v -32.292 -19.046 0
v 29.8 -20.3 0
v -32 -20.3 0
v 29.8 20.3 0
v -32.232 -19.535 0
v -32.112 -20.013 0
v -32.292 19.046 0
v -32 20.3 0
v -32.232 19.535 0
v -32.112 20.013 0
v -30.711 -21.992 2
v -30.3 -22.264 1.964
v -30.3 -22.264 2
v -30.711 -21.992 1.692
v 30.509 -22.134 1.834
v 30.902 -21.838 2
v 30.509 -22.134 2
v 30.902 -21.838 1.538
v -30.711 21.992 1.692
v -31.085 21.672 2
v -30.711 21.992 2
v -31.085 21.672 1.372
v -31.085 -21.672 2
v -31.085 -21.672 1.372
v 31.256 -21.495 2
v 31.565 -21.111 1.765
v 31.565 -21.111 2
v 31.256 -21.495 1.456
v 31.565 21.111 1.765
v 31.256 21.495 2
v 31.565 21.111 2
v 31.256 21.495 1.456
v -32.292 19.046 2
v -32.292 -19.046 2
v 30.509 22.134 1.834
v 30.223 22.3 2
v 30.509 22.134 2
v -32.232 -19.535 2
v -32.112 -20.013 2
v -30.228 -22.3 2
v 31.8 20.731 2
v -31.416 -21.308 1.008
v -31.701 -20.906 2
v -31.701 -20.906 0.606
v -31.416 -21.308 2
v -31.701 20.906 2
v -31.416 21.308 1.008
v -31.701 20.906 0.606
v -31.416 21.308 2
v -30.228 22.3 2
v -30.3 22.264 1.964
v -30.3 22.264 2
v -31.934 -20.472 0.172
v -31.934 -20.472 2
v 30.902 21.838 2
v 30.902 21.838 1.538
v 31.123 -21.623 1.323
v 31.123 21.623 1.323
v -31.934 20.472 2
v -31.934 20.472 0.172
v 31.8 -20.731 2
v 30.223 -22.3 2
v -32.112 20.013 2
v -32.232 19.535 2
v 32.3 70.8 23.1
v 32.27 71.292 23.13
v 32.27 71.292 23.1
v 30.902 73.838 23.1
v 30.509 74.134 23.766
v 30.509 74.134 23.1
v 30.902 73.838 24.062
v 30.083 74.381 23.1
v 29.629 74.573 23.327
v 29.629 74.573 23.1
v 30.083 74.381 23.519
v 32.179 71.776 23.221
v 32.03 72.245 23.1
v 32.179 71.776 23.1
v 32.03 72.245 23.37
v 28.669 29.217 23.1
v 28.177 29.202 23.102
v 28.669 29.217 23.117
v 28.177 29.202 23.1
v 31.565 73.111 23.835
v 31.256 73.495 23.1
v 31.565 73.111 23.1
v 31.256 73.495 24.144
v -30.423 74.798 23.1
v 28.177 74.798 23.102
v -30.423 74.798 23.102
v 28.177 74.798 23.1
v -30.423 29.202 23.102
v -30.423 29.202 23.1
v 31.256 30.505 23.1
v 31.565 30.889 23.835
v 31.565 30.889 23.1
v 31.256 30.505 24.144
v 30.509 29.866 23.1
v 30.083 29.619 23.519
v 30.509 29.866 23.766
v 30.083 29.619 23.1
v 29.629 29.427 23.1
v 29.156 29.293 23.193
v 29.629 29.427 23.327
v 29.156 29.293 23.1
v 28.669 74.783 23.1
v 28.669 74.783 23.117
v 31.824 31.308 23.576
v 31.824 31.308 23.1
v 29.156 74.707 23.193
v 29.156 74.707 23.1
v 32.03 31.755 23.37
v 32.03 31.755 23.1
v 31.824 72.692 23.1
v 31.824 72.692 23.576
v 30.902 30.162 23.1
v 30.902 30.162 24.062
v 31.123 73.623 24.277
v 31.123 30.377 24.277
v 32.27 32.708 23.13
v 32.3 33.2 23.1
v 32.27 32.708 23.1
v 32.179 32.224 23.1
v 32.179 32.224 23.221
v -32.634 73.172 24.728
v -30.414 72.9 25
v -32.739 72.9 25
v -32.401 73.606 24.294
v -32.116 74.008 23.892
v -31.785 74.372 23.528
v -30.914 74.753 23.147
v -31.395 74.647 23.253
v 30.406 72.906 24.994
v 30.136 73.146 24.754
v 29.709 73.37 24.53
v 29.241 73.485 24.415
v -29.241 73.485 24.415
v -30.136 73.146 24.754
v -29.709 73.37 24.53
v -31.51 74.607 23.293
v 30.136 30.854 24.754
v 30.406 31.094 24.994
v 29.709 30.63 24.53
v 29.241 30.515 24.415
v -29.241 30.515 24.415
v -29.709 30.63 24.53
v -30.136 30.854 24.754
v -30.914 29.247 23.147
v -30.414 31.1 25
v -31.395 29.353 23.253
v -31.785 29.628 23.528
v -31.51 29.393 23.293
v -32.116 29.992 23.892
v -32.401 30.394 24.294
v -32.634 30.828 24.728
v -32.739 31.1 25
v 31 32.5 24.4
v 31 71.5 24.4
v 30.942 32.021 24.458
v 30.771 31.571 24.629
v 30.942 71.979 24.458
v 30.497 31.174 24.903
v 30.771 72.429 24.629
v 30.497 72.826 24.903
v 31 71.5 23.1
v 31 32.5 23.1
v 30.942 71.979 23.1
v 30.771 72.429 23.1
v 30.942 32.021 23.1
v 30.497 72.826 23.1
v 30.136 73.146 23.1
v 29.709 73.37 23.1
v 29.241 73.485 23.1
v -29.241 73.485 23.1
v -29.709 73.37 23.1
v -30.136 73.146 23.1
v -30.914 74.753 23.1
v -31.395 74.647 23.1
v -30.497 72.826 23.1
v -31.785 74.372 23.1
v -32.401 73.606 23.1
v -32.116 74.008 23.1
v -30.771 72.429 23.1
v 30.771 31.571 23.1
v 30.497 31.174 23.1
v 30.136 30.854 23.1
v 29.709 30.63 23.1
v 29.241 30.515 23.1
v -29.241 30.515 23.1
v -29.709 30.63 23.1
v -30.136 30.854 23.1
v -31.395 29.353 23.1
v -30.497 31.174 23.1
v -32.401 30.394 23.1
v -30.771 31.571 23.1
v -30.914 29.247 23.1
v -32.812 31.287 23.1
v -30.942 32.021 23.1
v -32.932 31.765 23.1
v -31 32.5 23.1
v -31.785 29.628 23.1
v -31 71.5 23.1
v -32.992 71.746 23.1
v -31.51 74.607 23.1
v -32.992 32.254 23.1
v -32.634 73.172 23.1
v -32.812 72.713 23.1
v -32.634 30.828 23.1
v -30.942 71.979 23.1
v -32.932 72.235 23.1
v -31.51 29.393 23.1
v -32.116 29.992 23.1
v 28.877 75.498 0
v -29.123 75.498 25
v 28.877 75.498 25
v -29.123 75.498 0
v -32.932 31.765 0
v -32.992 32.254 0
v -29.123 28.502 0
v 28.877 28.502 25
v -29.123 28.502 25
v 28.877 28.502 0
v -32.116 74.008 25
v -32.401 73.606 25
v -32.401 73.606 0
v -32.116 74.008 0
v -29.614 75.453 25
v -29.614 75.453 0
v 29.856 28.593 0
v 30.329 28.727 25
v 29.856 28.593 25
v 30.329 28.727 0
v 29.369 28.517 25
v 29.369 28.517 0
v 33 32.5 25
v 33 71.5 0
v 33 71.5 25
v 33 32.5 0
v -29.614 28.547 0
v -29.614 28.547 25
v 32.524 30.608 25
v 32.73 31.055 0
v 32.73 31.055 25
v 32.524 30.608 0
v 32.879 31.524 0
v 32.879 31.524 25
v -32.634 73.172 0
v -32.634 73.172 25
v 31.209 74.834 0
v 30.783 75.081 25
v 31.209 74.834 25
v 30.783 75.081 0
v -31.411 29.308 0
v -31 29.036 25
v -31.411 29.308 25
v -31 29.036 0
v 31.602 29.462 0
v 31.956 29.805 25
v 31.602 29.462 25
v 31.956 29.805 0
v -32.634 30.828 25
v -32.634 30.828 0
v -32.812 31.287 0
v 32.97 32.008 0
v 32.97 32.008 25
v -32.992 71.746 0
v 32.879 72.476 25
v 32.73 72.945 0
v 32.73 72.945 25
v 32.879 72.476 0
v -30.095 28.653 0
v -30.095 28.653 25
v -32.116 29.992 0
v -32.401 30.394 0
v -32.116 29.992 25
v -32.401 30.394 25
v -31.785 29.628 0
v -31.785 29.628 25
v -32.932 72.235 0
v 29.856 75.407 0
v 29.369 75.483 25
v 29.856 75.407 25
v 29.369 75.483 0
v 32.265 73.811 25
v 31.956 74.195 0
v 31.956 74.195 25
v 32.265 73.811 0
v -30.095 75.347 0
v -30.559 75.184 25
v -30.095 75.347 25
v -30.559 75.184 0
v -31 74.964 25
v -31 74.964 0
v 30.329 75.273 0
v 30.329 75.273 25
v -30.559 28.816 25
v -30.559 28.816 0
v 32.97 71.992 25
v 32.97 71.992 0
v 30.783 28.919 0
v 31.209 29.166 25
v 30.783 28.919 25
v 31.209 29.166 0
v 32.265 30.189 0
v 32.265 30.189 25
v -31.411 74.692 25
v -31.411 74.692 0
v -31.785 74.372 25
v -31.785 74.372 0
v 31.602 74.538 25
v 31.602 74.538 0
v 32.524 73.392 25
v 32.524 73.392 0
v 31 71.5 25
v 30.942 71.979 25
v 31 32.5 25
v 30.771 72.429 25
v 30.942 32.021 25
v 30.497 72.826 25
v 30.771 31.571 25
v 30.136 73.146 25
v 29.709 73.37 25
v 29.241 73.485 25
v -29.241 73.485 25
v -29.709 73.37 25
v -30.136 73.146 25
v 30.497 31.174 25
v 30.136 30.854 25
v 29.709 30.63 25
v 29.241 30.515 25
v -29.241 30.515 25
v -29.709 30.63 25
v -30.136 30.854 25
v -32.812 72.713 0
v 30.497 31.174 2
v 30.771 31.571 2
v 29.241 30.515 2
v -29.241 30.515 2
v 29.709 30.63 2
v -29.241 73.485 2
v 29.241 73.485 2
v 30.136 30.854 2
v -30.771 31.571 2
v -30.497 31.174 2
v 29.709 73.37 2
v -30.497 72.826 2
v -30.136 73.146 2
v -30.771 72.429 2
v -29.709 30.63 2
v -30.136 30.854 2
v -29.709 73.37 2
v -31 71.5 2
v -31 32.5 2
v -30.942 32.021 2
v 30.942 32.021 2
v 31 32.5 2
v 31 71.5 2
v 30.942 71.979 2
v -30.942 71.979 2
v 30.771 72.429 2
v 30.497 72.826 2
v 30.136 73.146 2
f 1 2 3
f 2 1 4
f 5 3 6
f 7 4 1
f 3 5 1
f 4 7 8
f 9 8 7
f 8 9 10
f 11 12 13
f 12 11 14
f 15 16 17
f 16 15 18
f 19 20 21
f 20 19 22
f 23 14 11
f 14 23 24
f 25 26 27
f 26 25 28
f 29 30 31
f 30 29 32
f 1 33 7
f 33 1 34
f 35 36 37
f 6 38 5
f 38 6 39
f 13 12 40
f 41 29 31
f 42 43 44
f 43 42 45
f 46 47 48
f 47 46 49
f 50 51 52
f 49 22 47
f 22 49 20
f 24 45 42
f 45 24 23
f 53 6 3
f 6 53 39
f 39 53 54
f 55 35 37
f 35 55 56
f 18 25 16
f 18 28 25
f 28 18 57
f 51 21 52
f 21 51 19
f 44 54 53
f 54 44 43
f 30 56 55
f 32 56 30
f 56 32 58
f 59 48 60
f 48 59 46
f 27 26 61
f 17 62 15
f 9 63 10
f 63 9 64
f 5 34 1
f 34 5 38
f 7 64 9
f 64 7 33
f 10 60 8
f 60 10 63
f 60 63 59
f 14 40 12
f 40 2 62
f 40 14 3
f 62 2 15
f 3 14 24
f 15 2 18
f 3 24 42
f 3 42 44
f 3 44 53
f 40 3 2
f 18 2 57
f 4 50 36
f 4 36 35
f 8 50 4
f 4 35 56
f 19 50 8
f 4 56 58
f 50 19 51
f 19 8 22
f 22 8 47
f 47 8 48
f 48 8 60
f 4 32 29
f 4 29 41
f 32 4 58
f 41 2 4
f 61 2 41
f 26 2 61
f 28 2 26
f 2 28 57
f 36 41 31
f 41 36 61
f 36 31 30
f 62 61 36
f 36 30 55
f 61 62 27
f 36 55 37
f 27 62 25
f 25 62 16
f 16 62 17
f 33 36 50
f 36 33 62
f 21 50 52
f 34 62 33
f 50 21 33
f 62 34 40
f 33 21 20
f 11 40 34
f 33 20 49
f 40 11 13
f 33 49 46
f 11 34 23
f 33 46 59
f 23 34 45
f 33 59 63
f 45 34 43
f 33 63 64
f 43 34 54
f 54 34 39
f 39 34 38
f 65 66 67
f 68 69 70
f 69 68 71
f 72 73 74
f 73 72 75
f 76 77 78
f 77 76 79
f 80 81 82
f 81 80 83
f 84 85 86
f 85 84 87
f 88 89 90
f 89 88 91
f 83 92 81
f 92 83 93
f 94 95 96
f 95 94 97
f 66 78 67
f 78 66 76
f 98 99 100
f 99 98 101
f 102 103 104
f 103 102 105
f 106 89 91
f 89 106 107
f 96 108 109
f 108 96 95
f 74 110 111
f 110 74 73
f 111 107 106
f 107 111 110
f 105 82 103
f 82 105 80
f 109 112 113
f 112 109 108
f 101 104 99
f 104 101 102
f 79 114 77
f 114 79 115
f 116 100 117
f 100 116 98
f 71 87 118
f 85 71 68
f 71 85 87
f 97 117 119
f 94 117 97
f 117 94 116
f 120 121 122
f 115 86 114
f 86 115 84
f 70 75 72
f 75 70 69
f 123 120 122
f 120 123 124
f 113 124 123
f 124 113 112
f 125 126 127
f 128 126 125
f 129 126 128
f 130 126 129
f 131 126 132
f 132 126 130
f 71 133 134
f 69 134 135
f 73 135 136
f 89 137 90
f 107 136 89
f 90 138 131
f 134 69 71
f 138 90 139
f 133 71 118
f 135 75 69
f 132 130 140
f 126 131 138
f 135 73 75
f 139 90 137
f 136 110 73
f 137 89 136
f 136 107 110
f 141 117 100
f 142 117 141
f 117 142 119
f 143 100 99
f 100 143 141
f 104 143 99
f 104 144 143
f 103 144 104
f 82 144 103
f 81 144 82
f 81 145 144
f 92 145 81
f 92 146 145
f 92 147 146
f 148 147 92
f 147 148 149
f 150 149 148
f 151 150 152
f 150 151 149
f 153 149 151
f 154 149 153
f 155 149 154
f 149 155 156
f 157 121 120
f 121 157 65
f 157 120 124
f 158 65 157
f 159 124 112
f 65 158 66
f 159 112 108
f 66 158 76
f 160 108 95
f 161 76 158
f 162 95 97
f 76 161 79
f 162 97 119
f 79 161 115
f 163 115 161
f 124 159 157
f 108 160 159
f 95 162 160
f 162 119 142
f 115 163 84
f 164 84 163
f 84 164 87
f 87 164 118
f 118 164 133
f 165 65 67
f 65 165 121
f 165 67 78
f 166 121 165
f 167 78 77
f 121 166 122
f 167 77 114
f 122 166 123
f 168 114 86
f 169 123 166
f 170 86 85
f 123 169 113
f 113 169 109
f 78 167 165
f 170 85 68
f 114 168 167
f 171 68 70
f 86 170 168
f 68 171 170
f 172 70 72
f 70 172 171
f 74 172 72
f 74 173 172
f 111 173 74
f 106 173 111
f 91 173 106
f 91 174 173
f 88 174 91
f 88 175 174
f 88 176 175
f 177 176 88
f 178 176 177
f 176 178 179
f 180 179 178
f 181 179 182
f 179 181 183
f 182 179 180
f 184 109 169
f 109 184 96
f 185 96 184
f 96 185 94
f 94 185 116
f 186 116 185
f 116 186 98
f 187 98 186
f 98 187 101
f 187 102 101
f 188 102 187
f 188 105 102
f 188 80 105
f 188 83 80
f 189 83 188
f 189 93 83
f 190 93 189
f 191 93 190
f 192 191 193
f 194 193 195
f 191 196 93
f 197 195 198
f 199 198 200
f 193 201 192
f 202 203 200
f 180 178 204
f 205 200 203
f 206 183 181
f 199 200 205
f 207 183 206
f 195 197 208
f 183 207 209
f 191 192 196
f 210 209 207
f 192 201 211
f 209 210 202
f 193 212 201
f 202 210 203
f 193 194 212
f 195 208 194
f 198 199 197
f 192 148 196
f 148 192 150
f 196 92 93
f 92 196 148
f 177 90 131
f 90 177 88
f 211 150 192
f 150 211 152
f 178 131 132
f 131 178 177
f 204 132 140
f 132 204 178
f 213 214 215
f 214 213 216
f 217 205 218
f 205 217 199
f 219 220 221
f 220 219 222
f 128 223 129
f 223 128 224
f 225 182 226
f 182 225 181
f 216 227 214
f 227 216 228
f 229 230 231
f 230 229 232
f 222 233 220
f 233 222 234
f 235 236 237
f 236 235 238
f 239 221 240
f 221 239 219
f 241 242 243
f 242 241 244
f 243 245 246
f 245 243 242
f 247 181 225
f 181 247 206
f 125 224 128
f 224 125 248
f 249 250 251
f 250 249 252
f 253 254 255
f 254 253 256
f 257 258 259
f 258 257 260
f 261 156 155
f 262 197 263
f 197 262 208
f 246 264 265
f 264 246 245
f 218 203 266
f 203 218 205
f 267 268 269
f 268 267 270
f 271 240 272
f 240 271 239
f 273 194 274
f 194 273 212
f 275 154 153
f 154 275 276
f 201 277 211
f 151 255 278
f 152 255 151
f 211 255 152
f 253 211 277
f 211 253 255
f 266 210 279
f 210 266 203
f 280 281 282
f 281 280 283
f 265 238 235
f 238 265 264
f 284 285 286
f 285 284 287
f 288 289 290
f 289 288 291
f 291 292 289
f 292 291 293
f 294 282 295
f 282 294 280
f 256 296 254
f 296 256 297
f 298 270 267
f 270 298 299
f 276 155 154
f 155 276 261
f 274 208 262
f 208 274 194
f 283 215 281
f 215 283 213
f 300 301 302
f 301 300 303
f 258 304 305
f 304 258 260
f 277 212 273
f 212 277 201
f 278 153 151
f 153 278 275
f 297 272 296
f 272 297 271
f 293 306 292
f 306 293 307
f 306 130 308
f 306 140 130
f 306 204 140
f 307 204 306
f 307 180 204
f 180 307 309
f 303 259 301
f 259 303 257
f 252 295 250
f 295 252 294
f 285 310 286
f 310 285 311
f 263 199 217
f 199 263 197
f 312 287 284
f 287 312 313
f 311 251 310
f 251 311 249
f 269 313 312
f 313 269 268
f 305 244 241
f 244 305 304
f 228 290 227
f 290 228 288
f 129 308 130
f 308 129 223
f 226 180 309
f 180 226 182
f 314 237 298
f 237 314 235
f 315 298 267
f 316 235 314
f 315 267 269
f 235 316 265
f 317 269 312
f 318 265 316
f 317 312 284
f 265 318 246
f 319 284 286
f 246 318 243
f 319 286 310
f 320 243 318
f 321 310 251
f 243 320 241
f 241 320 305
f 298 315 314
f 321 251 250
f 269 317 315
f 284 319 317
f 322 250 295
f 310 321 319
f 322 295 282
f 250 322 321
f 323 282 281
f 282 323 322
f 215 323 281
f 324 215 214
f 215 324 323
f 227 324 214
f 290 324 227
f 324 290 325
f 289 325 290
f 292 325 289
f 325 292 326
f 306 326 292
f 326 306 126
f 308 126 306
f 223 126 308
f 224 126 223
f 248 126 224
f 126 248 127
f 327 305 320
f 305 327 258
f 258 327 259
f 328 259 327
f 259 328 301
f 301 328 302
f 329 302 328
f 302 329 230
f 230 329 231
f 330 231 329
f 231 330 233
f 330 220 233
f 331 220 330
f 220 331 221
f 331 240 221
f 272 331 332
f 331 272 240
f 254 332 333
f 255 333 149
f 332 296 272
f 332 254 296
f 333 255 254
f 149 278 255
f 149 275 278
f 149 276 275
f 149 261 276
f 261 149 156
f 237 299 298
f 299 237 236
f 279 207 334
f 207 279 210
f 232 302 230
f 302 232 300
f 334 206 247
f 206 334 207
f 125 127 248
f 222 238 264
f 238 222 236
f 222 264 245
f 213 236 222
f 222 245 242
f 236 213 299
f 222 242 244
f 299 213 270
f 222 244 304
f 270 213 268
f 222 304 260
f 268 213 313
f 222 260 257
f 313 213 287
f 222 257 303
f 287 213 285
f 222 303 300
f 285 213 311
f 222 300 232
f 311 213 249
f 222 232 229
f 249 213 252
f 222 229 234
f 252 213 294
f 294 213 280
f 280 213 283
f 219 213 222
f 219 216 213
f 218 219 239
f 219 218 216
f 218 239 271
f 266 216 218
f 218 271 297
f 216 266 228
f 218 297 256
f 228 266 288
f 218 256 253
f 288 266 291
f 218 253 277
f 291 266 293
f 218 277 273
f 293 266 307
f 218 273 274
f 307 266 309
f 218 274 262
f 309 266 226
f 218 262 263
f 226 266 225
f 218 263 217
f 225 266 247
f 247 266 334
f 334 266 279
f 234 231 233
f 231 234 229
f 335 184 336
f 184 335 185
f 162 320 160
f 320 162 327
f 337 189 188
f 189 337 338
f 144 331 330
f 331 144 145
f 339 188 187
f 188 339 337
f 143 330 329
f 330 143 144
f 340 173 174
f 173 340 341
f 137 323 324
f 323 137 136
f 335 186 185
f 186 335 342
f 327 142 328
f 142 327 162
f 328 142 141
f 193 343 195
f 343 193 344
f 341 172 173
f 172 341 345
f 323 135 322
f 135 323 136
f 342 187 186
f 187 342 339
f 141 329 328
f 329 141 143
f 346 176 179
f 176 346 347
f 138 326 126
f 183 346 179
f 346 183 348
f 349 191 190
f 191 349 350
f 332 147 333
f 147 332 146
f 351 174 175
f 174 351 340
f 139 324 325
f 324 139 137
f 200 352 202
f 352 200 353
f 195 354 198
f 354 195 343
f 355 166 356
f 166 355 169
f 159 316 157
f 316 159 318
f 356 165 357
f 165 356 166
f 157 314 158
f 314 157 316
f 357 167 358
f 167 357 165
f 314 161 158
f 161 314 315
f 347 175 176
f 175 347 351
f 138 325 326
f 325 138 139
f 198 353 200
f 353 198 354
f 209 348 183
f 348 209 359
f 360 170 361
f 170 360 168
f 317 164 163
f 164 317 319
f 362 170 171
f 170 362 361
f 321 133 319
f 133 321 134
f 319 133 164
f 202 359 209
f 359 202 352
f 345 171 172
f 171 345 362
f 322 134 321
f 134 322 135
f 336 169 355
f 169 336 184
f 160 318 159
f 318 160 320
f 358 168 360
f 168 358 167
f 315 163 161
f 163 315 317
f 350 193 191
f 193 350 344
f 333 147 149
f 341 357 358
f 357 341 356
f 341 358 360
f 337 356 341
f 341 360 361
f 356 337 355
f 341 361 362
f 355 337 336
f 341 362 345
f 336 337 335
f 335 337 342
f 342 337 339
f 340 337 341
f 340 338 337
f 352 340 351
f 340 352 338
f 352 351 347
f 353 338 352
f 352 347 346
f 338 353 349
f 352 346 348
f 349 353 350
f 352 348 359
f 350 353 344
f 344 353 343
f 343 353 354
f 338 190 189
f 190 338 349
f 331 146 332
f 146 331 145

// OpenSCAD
//parametic rounded sliding lid & box
//john finch 12-1-13

//Version 1.1 12-2-13
//Fixed problem of boxes being slightly under dimensioned due to too few
//facets in the rounded corners.  Reworked the roundedRect module to use
//cylinders with facet count control.  This took the steps out of the rounded
//corners and brought the outside dimensions closer to specified. Compile time 
//is increased.


//User Inputs
width = 47;
len = 66;
height =25;
thickness = 2;
min_wall = 0.7; //remaining wall thickness inside lid groove
radius = 4; // .1 to say 10
//End of user inputs

x1 = len/2;
y1 = width/2;
z1 = 0;


x2 = x1 - thickness;
y2 = y1 - thickness;
z2 = z1 + thickness;

echo (x1,x2,y1,y2);




module roundedRect(size, radius)  //modified William A Adams roundedrect.scad
{
x = size[0];
y = size[1];
z = size[2];
fa=0.01;
fs=0.5;
radius=max(0.1,radius);
radius=min(radius,10);
//echo ("Radius= ",radius);

//echo (x, y, z, radius);


hull()
	{
	translate([-x/2+radius,-y/2+radius,0])
	cylinder(h=z,r1=radius,r2=radius,$fa=1,$fs=fs);
	
	translate([x/2-radius,-y/2+radius,0])
	cylinder(h=z,r1=radius,r2=radius,$fa=1,$fs=fs);

	translate([-x/2+radius,y/2-radius,0])
	cylinder(h=z,r1=radius,r2=radius,$fa=1,$fs=fs);

	translate([x/2-radius,y/2-radius,0])
	cylinder(h=z,r1=radius,r2=radius,$fa=1,$fs=fs);

	}
}
module lid_trimmer(){
difference(){
	translate([-(len+5)/2,-(width+5)/2,0])
	cube([len+5,width+5,thickness+5]);
	roundedRect([len-2*min_wall,width-2*min_wall,thickness+5],radius);
	}

}

module lid(adjust){

difference(){
	polyhedron ( 
				points = [	[-x1,-y2+min_wall+adjust,0], 
							[x2-min_wall-adjust,-y2+min_wall+adjust,0],
							[x2-min_wall-adjust,y2-min_wall-adjust,0], 
							[-x1,y2-min_wall-adjust,0],
							[-x1,-y1+min_wall+adjust,z2],
							[x1-min_wall-adjust,-y1+min_wall+adjust,z2], 
							[x1-min_wall-adjust,y1-min_wall-adjust,z2], 
							[-x1,y1-min_wall-adjust,z2]], 

			triangles = [	[0,5,1], 
							[5,0,4], 
							[1,6,2], 
							[1,5,6], 
							[6,3,2], 
							[6,7,3], 
							[7,0	,3], 
							[4,0,7], 
							[4,6,5], 
							[6,4,7], 
							[0,1,2], 
							[0,2,3]]);
	lid_trimmer();
	}
}

module box() {
difference(){
	
	translate([0,5+width,0])
	roundedRect([len,width,height],radius);

	
	translate([0,5+width,thickness])
	roundedRect([len-2*thickness,width-2*thickness,height],radius-thickness);
	
	translate([0,5+width,height+.1])
	rotate([180,0,0])
	lid(0);
	//cut slot end open
	translate([-thickness,5+width,height+.1])
	rotate([180,0,0])
	lid(0);

	}
	/*
	translate([0,5+width,height+.1])
	rotate([180,0,0])
	lid(.5);
	*/

}

//print lid undersized in length by .5mm and width by 1.0 mm

lid(.5);
	
//lid_trimmer();
box();
